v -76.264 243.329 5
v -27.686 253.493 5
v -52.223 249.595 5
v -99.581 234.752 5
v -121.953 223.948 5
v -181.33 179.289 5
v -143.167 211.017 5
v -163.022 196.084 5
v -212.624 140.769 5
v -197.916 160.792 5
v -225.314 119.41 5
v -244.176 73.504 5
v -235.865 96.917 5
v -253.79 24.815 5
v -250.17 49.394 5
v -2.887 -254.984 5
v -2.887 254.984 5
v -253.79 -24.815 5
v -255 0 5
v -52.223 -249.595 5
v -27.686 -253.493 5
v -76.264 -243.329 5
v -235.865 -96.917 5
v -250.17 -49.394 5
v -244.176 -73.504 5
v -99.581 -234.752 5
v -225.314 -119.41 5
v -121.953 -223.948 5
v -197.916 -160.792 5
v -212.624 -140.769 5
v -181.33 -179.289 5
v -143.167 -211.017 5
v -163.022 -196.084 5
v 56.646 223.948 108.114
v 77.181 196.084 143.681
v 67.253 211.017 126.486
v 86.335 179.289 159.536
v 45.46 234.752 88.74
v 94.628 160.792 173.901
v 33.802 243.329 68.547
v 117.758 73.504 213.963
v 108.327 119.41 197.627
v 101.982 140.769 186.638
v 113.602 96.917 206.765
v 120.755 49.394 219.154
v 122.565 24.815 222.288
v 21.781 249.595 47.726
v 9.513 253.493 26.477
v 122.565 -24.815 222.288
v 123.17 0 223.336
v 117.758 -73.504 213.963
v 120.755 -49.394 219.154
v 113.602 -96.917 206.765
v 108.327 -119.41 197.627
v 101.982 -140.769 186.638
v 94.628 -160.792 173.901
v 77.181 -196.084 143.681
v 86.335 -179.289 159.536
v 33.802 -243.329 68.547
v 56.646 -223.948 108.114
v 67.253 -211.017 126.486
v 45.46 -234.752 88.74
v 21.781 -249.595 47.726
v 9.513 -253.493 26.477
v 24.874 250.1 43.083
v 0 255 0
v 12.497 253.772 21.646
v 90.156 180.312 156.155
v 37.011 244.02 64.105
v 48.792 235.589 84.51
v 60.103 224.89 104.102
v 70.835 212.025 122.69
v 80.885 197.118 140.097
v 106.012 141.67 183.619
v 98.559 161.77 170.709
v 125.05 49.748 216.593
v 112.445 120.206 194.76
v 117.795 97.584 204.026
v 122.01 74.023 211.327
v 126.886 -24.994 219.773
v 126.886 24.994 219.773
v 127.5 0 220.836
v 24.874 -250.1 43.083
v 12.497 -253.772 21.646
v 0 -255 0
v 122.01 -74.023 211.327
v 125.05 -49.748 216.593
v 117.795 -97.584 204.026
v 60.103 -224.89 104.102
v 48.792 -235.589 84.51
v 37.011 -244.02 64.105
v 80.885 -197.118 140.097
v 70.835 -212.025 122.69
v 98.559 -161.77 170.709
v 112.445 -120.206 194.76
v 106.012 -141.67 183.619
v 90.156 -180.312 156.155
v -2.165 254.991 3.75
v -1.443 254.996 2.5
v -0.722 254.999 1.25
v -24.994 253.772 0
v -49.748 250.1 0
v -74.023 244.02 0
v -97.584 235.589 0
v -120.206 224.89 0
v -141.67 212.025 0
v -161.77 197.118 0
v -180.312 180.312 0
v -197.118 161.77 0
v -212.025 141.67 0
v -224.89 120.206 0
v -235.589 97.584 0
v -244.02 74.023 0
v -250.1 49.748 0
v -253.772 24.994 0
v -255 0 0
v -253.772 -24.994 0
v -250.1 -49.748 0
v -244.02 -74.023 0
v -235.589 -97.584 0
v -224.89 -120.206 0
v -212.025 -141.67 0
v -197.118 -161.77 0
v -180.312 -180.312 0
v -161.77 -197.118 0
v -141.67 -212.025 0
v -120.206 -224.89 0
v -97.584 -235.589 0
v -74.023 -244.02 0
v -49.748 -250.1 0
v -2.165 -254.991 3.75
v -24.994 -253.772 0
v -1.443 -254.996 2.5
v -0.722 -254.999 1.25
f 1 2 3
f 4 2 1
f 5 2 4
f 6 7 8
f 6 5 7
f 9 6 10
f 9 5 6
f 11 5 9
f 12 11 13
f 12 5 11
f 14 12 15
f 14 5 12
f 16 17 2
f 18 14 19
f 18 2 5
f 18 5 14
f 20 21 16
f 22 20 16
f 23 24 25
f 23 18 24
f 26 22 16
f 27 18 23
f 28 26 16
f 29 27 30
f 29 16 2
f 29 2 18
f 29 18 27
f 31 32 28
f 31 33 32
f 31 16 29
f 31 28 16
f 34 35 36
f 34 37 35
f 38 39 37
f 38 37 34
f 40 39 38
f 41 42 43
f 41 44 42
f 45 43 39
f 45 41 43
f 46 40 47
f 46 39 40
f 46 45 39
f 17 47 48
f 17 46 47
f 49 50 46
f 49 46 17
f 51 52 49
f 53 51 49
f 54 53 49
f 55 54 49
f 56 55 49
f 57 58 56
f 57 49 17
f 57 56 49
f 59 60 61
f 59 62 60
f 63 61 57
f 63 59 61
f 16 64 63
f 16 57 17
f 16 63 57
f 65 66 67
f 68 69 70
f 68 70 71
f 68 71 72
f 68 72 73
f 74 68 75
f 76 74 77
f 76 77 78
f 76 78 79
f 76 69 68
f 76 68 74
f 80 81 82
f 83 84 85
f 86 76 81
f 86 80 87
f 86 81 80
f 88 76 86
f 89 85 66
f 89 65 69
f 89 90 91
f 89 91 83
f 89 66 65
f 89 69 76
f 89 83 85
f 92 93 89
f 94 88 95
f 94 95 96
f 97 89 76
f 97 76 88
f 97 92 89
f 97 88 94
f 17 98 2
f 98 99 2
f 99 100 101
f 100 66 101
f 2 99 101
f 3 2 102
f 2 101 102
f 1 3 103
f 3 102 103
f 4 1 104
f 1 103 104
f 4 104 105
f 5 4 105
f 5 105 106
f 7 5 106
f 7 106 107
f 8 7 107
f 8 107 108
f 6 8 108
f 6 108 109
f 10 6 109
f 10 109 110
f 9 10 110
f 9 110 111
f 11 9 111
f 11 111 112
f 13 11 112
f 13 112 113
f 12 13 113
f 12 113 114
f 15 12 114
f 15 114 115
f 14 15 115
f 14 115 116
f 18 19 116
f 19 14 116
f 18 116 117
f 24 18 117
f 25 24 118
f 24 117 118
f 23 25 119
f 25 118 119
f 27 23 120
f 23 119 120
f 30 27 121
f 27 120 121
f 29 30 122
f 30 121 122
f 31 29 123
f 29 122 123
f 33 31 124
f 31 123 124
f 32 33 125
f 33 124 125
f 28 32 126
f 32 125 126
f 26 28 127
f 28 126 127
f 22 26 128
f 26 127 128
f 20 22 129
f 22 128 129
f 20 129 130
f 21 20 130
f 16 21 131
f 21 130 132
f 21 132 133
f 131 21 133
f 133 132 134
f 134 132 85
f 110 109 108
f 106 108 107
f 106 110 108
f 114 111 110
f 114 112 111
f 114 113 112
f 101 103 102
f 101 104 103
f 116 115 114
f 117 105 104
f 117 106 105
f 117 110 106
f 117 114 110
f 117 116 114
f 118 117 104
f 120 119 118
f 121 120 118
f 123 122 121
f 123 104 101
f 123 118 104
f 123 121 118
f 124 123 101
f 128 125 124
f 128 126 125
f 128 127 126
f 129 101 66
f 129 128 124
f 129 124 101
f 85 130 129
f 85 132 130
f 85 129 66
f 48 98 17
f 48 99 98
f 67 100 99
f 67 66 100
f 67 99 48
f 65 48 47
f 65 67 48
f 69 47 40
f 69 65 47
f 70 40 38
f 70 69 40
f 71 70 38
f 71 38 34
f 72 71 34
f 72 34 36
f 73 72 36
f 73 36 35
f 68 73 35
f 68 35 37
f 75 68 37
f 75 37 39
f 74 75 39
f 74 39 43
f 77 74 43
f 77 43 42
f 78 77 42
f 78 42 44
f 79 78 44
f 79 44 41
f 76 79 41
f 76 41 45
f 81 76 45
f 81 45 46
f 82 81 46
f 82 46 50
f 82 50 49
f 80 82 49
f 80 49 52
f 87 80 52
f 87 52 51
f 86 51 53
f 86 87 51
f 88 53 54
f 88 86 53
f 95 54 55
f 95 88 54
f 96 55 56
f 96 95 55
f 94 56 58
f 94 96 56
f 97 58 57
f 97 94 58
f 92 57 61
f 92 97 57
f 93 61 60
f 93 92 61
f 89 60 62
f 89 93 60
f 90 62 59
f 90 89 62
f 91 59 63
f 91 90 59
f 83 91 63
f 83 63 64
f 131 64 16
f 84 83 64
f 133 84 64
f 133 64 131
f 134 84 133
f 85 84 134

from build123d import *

# Parameters (mm, degrees)
F1_DEPTH      = 300
F1_DEPTH_BACK = 300
F2_R          = 255
F3_DEPTH      = 500
F4_R          = 255
F5_DEPTH      = 500


with BuildPart() as f1:
    # F0 (on Front) → F1 (new body, two sides)
    with BuildSketch(Plane.XZ) as f1_sk:
        Polygon((-300, 0), (0, 0), (150, 259.8076211353), (145.6698729811, 262.3076211353), (-2.8867513459, 5), (-300, 5), align=None)
    extrude(amount=F1_DEPTH)
    extrude(f1_sk.sketch, amount=-F1_DEPTH_BACK)

    # F2 (on Top) → F3 (intersect)
    with BuildSketch(Plane.XY):
        Circle(F2_R)
    extrude(amount=F3_DEPTH, mode=Mode.INTERSECT)

    # F4 (on face) → F5 (intersect)
    with BuildSketch(Plane(origin=(0, 0, 0), x_dir=(0, 1, 0), z_dir=(0.8660254038, 0, -0.5))):
        Circle(F4_R)
    extrude(amount=-F5_DEPTH, mode=Mode.INTERSECT)


solid = f1.part
